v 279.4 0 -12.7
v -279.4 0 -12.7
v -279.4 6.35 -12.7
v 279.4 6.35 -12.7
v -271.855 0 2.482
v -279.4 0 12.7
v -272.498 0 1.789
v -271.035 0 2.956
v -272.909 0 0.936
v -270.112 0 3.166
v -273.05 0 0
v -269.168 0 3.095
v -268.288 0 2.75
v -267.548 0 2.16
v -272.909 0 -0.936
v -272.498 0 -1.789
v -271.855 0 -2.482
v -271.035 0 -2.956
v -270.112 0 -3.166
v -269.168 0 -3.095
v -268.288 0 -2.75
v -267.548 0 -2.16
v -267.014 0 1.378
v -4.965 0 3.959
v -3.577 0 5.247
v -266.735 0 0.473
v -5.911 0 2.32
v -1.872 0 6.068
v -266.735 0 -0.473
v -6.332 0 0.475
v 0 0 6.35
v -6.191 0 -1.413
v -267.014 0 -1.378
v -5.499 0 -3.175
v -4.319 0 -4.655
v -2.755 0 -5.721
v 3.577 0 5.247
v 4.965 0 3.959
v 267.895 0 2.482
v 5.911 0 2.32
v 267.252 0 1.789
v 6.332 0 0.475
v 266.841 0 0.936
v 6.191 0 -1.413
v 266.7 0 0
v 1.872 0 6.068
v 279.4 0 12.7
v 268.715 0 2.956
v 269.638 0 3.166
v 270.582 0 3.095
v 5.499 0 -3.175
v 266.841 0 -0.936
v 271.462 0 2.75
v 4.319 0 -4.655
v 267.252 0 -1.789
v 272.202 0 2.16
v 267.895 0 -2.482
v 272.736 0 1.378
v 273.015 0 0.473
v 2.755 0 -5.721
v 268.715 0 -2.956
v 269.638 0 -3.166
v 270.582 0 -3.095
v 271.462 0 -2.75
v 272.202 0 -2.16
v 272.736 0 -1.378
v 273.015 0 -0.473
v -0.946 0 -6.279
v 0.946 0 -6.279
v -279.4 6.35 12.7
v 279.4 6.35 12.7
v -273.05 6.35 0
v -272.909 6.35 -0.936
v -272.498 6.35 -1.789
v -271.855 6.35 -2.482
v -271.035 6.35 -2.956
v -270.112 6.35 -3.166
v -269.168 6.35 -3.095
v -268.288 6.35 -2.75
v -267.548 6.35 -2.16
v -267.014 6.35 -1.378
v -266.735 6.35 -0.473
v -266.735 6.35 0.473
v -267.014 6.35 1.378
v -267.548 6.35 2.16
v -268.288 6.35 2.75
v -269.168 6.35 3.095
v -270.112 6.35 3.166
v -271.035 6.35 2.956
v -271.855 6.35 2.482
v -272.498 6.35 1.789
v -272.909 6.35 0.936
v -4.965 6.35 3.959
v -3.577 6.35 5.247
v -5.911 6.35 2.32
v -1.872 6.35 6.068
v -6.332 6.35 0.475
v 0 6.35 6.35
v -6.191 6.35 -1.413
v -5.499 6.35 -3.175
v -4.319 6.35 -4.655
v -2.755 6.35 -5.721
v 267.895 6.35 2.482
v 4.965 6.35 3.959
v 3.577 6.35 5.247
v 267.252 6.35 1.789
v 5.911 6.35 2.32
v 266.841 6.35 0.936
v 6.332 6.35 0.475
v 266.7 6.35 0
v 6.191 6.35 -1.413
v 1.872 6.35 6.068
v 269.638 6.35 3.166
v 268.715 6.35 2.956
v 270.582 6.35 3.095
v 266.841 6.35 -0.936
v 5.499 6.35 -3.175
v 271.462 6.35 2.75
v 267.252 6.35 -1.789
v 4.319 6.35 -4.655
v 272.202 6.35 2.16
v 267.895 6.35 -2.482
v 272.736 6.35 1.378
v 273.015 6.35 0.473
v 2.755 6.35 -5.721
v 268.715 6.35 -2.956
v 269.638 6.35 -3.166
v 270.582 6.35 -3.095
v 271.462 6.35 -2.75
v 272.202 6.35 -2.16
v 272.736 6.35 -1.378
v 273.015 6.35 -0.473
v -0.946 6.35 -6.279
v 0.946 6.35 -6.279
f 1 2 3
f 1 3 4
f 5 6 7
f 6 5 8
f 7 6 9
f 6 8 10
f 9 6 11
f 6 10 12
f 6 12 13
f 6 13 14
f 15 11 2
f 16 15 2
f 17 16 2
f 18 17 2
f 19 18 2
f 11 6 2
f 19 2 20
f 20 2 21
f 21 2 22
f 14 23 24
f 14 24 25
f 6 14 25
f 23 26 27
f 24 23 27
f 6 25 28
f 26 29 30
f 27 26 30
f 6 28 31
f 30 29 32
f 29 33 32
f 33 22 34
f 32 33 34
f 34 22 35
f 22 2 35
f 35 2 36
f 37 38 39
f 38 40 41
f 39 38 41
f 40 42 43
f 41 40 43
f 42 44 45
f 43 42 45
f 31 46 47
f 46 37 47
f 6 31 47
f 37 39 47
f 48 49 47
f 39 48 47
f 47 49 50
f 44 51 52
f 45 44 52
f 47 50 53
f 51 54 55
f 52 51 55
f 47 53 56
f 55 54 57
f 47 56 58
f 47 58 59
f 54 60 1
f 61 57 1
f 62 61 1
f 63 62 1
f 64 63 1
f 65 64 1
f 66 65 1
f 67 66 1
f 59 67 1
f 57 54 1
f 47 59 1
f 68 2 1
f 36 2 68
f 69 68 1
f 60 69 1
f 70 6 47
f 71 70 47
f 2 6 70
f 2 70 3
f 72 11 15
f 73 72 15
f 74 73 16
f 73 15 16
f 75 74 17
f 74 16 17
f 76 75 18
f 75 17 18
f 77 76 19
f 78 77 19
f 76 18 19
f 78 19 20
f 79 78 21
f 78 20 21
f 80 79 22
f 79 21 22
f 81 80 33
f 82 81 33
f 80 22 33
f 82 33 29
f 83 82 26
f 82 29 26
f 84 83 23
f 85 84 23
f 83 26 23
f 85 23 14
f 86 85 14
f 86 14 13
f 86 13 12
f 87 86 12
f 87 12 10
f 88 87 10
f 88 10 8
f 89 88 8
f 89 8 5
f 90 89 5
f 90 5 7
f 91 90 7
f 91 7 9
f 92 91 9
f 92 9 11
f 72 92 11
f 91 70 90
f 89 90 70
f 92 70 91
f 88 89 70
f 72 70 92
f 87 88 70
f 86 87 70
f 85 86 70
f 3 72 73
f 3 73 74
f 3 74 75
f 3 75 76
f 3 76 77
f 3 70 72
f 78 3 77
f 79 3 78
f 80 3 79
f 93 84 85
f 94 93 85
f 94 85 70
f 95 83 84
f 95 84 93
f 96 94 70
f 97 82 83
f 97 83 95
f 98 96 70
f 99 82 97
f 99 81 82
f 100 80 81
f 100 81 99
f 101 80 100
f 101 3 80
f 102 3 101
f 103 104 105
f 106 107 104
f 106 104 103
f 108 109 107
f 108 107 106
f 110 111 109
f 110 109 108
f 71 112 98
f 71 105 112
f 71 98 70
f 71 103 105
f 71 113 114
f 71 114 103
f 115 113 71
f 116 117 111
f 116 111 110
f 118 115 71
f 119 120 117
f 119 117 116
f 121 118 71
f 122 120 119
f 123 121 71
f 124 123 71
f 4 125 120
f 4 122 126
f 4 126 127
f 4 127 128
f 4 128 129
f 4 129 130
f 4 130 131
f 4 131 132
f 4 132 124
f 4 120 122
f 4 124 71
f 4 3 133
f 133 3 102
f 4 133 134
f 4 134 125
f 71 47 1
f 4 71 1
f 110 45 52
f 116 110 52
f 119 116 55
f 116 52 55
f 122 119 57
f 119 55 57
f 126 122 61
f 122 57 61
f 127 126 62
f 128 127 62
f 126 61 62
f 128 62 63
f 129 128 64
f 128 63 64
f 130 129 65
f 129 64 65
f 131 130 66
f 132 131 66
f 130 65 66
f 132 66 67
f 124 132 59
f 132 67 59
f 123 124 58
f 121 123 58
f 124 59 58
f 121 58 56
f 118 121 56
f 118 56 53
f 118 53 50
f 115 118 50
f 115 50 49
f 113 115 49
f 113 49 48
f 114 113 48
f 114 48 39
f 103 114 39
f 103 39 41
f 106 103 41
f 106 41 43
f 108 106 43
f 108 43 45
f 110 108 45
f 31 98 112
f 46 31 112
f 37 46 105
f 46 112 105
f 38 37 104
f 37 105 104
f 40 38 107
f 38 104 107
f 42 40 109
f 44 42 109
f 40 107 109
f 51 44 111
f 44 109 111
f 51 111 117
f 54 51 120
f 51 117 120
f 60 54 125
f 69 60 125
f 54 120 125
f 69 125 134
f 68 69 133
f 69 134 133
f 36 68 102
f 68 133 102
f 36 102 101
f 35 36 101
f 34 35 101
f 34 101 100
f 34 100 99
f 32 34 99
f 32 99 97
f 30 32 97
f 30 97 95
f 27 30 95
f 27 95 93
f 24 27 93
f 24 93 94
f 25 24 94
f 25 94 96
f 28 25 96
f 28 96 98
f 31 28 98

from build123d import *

# Parameters (mm, degrees)
SKETCH1_W                       = 558.8
SKETCH1_H                       = 25.4
BOSS_EXTRUDE1_DEPTH             = 6.35
F_1_4_0_25_DIAMETER_HOLE1_D     = 6.35
F_1_4_0_25_DIAMETER_HOLE1_DEPTH = 17.019524
F_1_4_0_25_DIAMETER_HOLE1_TIP   = 1.907732465
SKETCH5_R                       = 6.35
CUT_EXTRUDE1_DEPTH              = 280.760562803


with BuildPart() as part:
    # Sketch1 → Boss-Extrude1 (new body)
    with BuildSketch(Plane(origin=(0, 0, 0), x_dir=(1, 0, 0), z_dir=(0, 1, 0))):
        Rectangle(SKETCH1_W, SKETCH1_H)
    extrude(amount=BOSS_EXTRUDE1_DEPTH)

    # 1/4 (0.25) Diameter Hole1
    with Locations(Plane(origin=(0, 6.35, 0), x_dir=(1, 0, 0), z_dir=(0, 1, 0))):
        with Locations((-269.875, 0), (269.875, 0)):
            Hole(F_1_4_0_25_DIAMETER_HOLE1_D / 2, depth=F_1_4_0_25_DIAMETER_HOLE1_DEPTH)
            with Locations((0, 0, -(F_1_4_0_25_DIAMETER_HOLE1_DEPTH + F_1_4_0_25_DIAMETER_HOLE1_TIP / 2))):  # 118° drill point
                Cone(0, F_1_4_0_25_DIAMETER_HOLE1_D / 2, F_1_4_0_25_DIAMETER_HOLE1_TIP, mode=Mode.SUBTRACT)

    # Sketch5 → Cut-Extrude1 (cut, through all)
    with BuildSketch(Plane(origin=(0, 6.35, 0), x_dir=(1, 0, 0), z_dir=(0, 1, 0))):
        with Locations(Location((0, 0, 0), (0, 0, 270))):
            Circle(SKETCH5_R)
    extrude(amount=-CUT_EXTRUDE1_DEPTH, mode=Mode.SUBTRACT)


solid = part.part
